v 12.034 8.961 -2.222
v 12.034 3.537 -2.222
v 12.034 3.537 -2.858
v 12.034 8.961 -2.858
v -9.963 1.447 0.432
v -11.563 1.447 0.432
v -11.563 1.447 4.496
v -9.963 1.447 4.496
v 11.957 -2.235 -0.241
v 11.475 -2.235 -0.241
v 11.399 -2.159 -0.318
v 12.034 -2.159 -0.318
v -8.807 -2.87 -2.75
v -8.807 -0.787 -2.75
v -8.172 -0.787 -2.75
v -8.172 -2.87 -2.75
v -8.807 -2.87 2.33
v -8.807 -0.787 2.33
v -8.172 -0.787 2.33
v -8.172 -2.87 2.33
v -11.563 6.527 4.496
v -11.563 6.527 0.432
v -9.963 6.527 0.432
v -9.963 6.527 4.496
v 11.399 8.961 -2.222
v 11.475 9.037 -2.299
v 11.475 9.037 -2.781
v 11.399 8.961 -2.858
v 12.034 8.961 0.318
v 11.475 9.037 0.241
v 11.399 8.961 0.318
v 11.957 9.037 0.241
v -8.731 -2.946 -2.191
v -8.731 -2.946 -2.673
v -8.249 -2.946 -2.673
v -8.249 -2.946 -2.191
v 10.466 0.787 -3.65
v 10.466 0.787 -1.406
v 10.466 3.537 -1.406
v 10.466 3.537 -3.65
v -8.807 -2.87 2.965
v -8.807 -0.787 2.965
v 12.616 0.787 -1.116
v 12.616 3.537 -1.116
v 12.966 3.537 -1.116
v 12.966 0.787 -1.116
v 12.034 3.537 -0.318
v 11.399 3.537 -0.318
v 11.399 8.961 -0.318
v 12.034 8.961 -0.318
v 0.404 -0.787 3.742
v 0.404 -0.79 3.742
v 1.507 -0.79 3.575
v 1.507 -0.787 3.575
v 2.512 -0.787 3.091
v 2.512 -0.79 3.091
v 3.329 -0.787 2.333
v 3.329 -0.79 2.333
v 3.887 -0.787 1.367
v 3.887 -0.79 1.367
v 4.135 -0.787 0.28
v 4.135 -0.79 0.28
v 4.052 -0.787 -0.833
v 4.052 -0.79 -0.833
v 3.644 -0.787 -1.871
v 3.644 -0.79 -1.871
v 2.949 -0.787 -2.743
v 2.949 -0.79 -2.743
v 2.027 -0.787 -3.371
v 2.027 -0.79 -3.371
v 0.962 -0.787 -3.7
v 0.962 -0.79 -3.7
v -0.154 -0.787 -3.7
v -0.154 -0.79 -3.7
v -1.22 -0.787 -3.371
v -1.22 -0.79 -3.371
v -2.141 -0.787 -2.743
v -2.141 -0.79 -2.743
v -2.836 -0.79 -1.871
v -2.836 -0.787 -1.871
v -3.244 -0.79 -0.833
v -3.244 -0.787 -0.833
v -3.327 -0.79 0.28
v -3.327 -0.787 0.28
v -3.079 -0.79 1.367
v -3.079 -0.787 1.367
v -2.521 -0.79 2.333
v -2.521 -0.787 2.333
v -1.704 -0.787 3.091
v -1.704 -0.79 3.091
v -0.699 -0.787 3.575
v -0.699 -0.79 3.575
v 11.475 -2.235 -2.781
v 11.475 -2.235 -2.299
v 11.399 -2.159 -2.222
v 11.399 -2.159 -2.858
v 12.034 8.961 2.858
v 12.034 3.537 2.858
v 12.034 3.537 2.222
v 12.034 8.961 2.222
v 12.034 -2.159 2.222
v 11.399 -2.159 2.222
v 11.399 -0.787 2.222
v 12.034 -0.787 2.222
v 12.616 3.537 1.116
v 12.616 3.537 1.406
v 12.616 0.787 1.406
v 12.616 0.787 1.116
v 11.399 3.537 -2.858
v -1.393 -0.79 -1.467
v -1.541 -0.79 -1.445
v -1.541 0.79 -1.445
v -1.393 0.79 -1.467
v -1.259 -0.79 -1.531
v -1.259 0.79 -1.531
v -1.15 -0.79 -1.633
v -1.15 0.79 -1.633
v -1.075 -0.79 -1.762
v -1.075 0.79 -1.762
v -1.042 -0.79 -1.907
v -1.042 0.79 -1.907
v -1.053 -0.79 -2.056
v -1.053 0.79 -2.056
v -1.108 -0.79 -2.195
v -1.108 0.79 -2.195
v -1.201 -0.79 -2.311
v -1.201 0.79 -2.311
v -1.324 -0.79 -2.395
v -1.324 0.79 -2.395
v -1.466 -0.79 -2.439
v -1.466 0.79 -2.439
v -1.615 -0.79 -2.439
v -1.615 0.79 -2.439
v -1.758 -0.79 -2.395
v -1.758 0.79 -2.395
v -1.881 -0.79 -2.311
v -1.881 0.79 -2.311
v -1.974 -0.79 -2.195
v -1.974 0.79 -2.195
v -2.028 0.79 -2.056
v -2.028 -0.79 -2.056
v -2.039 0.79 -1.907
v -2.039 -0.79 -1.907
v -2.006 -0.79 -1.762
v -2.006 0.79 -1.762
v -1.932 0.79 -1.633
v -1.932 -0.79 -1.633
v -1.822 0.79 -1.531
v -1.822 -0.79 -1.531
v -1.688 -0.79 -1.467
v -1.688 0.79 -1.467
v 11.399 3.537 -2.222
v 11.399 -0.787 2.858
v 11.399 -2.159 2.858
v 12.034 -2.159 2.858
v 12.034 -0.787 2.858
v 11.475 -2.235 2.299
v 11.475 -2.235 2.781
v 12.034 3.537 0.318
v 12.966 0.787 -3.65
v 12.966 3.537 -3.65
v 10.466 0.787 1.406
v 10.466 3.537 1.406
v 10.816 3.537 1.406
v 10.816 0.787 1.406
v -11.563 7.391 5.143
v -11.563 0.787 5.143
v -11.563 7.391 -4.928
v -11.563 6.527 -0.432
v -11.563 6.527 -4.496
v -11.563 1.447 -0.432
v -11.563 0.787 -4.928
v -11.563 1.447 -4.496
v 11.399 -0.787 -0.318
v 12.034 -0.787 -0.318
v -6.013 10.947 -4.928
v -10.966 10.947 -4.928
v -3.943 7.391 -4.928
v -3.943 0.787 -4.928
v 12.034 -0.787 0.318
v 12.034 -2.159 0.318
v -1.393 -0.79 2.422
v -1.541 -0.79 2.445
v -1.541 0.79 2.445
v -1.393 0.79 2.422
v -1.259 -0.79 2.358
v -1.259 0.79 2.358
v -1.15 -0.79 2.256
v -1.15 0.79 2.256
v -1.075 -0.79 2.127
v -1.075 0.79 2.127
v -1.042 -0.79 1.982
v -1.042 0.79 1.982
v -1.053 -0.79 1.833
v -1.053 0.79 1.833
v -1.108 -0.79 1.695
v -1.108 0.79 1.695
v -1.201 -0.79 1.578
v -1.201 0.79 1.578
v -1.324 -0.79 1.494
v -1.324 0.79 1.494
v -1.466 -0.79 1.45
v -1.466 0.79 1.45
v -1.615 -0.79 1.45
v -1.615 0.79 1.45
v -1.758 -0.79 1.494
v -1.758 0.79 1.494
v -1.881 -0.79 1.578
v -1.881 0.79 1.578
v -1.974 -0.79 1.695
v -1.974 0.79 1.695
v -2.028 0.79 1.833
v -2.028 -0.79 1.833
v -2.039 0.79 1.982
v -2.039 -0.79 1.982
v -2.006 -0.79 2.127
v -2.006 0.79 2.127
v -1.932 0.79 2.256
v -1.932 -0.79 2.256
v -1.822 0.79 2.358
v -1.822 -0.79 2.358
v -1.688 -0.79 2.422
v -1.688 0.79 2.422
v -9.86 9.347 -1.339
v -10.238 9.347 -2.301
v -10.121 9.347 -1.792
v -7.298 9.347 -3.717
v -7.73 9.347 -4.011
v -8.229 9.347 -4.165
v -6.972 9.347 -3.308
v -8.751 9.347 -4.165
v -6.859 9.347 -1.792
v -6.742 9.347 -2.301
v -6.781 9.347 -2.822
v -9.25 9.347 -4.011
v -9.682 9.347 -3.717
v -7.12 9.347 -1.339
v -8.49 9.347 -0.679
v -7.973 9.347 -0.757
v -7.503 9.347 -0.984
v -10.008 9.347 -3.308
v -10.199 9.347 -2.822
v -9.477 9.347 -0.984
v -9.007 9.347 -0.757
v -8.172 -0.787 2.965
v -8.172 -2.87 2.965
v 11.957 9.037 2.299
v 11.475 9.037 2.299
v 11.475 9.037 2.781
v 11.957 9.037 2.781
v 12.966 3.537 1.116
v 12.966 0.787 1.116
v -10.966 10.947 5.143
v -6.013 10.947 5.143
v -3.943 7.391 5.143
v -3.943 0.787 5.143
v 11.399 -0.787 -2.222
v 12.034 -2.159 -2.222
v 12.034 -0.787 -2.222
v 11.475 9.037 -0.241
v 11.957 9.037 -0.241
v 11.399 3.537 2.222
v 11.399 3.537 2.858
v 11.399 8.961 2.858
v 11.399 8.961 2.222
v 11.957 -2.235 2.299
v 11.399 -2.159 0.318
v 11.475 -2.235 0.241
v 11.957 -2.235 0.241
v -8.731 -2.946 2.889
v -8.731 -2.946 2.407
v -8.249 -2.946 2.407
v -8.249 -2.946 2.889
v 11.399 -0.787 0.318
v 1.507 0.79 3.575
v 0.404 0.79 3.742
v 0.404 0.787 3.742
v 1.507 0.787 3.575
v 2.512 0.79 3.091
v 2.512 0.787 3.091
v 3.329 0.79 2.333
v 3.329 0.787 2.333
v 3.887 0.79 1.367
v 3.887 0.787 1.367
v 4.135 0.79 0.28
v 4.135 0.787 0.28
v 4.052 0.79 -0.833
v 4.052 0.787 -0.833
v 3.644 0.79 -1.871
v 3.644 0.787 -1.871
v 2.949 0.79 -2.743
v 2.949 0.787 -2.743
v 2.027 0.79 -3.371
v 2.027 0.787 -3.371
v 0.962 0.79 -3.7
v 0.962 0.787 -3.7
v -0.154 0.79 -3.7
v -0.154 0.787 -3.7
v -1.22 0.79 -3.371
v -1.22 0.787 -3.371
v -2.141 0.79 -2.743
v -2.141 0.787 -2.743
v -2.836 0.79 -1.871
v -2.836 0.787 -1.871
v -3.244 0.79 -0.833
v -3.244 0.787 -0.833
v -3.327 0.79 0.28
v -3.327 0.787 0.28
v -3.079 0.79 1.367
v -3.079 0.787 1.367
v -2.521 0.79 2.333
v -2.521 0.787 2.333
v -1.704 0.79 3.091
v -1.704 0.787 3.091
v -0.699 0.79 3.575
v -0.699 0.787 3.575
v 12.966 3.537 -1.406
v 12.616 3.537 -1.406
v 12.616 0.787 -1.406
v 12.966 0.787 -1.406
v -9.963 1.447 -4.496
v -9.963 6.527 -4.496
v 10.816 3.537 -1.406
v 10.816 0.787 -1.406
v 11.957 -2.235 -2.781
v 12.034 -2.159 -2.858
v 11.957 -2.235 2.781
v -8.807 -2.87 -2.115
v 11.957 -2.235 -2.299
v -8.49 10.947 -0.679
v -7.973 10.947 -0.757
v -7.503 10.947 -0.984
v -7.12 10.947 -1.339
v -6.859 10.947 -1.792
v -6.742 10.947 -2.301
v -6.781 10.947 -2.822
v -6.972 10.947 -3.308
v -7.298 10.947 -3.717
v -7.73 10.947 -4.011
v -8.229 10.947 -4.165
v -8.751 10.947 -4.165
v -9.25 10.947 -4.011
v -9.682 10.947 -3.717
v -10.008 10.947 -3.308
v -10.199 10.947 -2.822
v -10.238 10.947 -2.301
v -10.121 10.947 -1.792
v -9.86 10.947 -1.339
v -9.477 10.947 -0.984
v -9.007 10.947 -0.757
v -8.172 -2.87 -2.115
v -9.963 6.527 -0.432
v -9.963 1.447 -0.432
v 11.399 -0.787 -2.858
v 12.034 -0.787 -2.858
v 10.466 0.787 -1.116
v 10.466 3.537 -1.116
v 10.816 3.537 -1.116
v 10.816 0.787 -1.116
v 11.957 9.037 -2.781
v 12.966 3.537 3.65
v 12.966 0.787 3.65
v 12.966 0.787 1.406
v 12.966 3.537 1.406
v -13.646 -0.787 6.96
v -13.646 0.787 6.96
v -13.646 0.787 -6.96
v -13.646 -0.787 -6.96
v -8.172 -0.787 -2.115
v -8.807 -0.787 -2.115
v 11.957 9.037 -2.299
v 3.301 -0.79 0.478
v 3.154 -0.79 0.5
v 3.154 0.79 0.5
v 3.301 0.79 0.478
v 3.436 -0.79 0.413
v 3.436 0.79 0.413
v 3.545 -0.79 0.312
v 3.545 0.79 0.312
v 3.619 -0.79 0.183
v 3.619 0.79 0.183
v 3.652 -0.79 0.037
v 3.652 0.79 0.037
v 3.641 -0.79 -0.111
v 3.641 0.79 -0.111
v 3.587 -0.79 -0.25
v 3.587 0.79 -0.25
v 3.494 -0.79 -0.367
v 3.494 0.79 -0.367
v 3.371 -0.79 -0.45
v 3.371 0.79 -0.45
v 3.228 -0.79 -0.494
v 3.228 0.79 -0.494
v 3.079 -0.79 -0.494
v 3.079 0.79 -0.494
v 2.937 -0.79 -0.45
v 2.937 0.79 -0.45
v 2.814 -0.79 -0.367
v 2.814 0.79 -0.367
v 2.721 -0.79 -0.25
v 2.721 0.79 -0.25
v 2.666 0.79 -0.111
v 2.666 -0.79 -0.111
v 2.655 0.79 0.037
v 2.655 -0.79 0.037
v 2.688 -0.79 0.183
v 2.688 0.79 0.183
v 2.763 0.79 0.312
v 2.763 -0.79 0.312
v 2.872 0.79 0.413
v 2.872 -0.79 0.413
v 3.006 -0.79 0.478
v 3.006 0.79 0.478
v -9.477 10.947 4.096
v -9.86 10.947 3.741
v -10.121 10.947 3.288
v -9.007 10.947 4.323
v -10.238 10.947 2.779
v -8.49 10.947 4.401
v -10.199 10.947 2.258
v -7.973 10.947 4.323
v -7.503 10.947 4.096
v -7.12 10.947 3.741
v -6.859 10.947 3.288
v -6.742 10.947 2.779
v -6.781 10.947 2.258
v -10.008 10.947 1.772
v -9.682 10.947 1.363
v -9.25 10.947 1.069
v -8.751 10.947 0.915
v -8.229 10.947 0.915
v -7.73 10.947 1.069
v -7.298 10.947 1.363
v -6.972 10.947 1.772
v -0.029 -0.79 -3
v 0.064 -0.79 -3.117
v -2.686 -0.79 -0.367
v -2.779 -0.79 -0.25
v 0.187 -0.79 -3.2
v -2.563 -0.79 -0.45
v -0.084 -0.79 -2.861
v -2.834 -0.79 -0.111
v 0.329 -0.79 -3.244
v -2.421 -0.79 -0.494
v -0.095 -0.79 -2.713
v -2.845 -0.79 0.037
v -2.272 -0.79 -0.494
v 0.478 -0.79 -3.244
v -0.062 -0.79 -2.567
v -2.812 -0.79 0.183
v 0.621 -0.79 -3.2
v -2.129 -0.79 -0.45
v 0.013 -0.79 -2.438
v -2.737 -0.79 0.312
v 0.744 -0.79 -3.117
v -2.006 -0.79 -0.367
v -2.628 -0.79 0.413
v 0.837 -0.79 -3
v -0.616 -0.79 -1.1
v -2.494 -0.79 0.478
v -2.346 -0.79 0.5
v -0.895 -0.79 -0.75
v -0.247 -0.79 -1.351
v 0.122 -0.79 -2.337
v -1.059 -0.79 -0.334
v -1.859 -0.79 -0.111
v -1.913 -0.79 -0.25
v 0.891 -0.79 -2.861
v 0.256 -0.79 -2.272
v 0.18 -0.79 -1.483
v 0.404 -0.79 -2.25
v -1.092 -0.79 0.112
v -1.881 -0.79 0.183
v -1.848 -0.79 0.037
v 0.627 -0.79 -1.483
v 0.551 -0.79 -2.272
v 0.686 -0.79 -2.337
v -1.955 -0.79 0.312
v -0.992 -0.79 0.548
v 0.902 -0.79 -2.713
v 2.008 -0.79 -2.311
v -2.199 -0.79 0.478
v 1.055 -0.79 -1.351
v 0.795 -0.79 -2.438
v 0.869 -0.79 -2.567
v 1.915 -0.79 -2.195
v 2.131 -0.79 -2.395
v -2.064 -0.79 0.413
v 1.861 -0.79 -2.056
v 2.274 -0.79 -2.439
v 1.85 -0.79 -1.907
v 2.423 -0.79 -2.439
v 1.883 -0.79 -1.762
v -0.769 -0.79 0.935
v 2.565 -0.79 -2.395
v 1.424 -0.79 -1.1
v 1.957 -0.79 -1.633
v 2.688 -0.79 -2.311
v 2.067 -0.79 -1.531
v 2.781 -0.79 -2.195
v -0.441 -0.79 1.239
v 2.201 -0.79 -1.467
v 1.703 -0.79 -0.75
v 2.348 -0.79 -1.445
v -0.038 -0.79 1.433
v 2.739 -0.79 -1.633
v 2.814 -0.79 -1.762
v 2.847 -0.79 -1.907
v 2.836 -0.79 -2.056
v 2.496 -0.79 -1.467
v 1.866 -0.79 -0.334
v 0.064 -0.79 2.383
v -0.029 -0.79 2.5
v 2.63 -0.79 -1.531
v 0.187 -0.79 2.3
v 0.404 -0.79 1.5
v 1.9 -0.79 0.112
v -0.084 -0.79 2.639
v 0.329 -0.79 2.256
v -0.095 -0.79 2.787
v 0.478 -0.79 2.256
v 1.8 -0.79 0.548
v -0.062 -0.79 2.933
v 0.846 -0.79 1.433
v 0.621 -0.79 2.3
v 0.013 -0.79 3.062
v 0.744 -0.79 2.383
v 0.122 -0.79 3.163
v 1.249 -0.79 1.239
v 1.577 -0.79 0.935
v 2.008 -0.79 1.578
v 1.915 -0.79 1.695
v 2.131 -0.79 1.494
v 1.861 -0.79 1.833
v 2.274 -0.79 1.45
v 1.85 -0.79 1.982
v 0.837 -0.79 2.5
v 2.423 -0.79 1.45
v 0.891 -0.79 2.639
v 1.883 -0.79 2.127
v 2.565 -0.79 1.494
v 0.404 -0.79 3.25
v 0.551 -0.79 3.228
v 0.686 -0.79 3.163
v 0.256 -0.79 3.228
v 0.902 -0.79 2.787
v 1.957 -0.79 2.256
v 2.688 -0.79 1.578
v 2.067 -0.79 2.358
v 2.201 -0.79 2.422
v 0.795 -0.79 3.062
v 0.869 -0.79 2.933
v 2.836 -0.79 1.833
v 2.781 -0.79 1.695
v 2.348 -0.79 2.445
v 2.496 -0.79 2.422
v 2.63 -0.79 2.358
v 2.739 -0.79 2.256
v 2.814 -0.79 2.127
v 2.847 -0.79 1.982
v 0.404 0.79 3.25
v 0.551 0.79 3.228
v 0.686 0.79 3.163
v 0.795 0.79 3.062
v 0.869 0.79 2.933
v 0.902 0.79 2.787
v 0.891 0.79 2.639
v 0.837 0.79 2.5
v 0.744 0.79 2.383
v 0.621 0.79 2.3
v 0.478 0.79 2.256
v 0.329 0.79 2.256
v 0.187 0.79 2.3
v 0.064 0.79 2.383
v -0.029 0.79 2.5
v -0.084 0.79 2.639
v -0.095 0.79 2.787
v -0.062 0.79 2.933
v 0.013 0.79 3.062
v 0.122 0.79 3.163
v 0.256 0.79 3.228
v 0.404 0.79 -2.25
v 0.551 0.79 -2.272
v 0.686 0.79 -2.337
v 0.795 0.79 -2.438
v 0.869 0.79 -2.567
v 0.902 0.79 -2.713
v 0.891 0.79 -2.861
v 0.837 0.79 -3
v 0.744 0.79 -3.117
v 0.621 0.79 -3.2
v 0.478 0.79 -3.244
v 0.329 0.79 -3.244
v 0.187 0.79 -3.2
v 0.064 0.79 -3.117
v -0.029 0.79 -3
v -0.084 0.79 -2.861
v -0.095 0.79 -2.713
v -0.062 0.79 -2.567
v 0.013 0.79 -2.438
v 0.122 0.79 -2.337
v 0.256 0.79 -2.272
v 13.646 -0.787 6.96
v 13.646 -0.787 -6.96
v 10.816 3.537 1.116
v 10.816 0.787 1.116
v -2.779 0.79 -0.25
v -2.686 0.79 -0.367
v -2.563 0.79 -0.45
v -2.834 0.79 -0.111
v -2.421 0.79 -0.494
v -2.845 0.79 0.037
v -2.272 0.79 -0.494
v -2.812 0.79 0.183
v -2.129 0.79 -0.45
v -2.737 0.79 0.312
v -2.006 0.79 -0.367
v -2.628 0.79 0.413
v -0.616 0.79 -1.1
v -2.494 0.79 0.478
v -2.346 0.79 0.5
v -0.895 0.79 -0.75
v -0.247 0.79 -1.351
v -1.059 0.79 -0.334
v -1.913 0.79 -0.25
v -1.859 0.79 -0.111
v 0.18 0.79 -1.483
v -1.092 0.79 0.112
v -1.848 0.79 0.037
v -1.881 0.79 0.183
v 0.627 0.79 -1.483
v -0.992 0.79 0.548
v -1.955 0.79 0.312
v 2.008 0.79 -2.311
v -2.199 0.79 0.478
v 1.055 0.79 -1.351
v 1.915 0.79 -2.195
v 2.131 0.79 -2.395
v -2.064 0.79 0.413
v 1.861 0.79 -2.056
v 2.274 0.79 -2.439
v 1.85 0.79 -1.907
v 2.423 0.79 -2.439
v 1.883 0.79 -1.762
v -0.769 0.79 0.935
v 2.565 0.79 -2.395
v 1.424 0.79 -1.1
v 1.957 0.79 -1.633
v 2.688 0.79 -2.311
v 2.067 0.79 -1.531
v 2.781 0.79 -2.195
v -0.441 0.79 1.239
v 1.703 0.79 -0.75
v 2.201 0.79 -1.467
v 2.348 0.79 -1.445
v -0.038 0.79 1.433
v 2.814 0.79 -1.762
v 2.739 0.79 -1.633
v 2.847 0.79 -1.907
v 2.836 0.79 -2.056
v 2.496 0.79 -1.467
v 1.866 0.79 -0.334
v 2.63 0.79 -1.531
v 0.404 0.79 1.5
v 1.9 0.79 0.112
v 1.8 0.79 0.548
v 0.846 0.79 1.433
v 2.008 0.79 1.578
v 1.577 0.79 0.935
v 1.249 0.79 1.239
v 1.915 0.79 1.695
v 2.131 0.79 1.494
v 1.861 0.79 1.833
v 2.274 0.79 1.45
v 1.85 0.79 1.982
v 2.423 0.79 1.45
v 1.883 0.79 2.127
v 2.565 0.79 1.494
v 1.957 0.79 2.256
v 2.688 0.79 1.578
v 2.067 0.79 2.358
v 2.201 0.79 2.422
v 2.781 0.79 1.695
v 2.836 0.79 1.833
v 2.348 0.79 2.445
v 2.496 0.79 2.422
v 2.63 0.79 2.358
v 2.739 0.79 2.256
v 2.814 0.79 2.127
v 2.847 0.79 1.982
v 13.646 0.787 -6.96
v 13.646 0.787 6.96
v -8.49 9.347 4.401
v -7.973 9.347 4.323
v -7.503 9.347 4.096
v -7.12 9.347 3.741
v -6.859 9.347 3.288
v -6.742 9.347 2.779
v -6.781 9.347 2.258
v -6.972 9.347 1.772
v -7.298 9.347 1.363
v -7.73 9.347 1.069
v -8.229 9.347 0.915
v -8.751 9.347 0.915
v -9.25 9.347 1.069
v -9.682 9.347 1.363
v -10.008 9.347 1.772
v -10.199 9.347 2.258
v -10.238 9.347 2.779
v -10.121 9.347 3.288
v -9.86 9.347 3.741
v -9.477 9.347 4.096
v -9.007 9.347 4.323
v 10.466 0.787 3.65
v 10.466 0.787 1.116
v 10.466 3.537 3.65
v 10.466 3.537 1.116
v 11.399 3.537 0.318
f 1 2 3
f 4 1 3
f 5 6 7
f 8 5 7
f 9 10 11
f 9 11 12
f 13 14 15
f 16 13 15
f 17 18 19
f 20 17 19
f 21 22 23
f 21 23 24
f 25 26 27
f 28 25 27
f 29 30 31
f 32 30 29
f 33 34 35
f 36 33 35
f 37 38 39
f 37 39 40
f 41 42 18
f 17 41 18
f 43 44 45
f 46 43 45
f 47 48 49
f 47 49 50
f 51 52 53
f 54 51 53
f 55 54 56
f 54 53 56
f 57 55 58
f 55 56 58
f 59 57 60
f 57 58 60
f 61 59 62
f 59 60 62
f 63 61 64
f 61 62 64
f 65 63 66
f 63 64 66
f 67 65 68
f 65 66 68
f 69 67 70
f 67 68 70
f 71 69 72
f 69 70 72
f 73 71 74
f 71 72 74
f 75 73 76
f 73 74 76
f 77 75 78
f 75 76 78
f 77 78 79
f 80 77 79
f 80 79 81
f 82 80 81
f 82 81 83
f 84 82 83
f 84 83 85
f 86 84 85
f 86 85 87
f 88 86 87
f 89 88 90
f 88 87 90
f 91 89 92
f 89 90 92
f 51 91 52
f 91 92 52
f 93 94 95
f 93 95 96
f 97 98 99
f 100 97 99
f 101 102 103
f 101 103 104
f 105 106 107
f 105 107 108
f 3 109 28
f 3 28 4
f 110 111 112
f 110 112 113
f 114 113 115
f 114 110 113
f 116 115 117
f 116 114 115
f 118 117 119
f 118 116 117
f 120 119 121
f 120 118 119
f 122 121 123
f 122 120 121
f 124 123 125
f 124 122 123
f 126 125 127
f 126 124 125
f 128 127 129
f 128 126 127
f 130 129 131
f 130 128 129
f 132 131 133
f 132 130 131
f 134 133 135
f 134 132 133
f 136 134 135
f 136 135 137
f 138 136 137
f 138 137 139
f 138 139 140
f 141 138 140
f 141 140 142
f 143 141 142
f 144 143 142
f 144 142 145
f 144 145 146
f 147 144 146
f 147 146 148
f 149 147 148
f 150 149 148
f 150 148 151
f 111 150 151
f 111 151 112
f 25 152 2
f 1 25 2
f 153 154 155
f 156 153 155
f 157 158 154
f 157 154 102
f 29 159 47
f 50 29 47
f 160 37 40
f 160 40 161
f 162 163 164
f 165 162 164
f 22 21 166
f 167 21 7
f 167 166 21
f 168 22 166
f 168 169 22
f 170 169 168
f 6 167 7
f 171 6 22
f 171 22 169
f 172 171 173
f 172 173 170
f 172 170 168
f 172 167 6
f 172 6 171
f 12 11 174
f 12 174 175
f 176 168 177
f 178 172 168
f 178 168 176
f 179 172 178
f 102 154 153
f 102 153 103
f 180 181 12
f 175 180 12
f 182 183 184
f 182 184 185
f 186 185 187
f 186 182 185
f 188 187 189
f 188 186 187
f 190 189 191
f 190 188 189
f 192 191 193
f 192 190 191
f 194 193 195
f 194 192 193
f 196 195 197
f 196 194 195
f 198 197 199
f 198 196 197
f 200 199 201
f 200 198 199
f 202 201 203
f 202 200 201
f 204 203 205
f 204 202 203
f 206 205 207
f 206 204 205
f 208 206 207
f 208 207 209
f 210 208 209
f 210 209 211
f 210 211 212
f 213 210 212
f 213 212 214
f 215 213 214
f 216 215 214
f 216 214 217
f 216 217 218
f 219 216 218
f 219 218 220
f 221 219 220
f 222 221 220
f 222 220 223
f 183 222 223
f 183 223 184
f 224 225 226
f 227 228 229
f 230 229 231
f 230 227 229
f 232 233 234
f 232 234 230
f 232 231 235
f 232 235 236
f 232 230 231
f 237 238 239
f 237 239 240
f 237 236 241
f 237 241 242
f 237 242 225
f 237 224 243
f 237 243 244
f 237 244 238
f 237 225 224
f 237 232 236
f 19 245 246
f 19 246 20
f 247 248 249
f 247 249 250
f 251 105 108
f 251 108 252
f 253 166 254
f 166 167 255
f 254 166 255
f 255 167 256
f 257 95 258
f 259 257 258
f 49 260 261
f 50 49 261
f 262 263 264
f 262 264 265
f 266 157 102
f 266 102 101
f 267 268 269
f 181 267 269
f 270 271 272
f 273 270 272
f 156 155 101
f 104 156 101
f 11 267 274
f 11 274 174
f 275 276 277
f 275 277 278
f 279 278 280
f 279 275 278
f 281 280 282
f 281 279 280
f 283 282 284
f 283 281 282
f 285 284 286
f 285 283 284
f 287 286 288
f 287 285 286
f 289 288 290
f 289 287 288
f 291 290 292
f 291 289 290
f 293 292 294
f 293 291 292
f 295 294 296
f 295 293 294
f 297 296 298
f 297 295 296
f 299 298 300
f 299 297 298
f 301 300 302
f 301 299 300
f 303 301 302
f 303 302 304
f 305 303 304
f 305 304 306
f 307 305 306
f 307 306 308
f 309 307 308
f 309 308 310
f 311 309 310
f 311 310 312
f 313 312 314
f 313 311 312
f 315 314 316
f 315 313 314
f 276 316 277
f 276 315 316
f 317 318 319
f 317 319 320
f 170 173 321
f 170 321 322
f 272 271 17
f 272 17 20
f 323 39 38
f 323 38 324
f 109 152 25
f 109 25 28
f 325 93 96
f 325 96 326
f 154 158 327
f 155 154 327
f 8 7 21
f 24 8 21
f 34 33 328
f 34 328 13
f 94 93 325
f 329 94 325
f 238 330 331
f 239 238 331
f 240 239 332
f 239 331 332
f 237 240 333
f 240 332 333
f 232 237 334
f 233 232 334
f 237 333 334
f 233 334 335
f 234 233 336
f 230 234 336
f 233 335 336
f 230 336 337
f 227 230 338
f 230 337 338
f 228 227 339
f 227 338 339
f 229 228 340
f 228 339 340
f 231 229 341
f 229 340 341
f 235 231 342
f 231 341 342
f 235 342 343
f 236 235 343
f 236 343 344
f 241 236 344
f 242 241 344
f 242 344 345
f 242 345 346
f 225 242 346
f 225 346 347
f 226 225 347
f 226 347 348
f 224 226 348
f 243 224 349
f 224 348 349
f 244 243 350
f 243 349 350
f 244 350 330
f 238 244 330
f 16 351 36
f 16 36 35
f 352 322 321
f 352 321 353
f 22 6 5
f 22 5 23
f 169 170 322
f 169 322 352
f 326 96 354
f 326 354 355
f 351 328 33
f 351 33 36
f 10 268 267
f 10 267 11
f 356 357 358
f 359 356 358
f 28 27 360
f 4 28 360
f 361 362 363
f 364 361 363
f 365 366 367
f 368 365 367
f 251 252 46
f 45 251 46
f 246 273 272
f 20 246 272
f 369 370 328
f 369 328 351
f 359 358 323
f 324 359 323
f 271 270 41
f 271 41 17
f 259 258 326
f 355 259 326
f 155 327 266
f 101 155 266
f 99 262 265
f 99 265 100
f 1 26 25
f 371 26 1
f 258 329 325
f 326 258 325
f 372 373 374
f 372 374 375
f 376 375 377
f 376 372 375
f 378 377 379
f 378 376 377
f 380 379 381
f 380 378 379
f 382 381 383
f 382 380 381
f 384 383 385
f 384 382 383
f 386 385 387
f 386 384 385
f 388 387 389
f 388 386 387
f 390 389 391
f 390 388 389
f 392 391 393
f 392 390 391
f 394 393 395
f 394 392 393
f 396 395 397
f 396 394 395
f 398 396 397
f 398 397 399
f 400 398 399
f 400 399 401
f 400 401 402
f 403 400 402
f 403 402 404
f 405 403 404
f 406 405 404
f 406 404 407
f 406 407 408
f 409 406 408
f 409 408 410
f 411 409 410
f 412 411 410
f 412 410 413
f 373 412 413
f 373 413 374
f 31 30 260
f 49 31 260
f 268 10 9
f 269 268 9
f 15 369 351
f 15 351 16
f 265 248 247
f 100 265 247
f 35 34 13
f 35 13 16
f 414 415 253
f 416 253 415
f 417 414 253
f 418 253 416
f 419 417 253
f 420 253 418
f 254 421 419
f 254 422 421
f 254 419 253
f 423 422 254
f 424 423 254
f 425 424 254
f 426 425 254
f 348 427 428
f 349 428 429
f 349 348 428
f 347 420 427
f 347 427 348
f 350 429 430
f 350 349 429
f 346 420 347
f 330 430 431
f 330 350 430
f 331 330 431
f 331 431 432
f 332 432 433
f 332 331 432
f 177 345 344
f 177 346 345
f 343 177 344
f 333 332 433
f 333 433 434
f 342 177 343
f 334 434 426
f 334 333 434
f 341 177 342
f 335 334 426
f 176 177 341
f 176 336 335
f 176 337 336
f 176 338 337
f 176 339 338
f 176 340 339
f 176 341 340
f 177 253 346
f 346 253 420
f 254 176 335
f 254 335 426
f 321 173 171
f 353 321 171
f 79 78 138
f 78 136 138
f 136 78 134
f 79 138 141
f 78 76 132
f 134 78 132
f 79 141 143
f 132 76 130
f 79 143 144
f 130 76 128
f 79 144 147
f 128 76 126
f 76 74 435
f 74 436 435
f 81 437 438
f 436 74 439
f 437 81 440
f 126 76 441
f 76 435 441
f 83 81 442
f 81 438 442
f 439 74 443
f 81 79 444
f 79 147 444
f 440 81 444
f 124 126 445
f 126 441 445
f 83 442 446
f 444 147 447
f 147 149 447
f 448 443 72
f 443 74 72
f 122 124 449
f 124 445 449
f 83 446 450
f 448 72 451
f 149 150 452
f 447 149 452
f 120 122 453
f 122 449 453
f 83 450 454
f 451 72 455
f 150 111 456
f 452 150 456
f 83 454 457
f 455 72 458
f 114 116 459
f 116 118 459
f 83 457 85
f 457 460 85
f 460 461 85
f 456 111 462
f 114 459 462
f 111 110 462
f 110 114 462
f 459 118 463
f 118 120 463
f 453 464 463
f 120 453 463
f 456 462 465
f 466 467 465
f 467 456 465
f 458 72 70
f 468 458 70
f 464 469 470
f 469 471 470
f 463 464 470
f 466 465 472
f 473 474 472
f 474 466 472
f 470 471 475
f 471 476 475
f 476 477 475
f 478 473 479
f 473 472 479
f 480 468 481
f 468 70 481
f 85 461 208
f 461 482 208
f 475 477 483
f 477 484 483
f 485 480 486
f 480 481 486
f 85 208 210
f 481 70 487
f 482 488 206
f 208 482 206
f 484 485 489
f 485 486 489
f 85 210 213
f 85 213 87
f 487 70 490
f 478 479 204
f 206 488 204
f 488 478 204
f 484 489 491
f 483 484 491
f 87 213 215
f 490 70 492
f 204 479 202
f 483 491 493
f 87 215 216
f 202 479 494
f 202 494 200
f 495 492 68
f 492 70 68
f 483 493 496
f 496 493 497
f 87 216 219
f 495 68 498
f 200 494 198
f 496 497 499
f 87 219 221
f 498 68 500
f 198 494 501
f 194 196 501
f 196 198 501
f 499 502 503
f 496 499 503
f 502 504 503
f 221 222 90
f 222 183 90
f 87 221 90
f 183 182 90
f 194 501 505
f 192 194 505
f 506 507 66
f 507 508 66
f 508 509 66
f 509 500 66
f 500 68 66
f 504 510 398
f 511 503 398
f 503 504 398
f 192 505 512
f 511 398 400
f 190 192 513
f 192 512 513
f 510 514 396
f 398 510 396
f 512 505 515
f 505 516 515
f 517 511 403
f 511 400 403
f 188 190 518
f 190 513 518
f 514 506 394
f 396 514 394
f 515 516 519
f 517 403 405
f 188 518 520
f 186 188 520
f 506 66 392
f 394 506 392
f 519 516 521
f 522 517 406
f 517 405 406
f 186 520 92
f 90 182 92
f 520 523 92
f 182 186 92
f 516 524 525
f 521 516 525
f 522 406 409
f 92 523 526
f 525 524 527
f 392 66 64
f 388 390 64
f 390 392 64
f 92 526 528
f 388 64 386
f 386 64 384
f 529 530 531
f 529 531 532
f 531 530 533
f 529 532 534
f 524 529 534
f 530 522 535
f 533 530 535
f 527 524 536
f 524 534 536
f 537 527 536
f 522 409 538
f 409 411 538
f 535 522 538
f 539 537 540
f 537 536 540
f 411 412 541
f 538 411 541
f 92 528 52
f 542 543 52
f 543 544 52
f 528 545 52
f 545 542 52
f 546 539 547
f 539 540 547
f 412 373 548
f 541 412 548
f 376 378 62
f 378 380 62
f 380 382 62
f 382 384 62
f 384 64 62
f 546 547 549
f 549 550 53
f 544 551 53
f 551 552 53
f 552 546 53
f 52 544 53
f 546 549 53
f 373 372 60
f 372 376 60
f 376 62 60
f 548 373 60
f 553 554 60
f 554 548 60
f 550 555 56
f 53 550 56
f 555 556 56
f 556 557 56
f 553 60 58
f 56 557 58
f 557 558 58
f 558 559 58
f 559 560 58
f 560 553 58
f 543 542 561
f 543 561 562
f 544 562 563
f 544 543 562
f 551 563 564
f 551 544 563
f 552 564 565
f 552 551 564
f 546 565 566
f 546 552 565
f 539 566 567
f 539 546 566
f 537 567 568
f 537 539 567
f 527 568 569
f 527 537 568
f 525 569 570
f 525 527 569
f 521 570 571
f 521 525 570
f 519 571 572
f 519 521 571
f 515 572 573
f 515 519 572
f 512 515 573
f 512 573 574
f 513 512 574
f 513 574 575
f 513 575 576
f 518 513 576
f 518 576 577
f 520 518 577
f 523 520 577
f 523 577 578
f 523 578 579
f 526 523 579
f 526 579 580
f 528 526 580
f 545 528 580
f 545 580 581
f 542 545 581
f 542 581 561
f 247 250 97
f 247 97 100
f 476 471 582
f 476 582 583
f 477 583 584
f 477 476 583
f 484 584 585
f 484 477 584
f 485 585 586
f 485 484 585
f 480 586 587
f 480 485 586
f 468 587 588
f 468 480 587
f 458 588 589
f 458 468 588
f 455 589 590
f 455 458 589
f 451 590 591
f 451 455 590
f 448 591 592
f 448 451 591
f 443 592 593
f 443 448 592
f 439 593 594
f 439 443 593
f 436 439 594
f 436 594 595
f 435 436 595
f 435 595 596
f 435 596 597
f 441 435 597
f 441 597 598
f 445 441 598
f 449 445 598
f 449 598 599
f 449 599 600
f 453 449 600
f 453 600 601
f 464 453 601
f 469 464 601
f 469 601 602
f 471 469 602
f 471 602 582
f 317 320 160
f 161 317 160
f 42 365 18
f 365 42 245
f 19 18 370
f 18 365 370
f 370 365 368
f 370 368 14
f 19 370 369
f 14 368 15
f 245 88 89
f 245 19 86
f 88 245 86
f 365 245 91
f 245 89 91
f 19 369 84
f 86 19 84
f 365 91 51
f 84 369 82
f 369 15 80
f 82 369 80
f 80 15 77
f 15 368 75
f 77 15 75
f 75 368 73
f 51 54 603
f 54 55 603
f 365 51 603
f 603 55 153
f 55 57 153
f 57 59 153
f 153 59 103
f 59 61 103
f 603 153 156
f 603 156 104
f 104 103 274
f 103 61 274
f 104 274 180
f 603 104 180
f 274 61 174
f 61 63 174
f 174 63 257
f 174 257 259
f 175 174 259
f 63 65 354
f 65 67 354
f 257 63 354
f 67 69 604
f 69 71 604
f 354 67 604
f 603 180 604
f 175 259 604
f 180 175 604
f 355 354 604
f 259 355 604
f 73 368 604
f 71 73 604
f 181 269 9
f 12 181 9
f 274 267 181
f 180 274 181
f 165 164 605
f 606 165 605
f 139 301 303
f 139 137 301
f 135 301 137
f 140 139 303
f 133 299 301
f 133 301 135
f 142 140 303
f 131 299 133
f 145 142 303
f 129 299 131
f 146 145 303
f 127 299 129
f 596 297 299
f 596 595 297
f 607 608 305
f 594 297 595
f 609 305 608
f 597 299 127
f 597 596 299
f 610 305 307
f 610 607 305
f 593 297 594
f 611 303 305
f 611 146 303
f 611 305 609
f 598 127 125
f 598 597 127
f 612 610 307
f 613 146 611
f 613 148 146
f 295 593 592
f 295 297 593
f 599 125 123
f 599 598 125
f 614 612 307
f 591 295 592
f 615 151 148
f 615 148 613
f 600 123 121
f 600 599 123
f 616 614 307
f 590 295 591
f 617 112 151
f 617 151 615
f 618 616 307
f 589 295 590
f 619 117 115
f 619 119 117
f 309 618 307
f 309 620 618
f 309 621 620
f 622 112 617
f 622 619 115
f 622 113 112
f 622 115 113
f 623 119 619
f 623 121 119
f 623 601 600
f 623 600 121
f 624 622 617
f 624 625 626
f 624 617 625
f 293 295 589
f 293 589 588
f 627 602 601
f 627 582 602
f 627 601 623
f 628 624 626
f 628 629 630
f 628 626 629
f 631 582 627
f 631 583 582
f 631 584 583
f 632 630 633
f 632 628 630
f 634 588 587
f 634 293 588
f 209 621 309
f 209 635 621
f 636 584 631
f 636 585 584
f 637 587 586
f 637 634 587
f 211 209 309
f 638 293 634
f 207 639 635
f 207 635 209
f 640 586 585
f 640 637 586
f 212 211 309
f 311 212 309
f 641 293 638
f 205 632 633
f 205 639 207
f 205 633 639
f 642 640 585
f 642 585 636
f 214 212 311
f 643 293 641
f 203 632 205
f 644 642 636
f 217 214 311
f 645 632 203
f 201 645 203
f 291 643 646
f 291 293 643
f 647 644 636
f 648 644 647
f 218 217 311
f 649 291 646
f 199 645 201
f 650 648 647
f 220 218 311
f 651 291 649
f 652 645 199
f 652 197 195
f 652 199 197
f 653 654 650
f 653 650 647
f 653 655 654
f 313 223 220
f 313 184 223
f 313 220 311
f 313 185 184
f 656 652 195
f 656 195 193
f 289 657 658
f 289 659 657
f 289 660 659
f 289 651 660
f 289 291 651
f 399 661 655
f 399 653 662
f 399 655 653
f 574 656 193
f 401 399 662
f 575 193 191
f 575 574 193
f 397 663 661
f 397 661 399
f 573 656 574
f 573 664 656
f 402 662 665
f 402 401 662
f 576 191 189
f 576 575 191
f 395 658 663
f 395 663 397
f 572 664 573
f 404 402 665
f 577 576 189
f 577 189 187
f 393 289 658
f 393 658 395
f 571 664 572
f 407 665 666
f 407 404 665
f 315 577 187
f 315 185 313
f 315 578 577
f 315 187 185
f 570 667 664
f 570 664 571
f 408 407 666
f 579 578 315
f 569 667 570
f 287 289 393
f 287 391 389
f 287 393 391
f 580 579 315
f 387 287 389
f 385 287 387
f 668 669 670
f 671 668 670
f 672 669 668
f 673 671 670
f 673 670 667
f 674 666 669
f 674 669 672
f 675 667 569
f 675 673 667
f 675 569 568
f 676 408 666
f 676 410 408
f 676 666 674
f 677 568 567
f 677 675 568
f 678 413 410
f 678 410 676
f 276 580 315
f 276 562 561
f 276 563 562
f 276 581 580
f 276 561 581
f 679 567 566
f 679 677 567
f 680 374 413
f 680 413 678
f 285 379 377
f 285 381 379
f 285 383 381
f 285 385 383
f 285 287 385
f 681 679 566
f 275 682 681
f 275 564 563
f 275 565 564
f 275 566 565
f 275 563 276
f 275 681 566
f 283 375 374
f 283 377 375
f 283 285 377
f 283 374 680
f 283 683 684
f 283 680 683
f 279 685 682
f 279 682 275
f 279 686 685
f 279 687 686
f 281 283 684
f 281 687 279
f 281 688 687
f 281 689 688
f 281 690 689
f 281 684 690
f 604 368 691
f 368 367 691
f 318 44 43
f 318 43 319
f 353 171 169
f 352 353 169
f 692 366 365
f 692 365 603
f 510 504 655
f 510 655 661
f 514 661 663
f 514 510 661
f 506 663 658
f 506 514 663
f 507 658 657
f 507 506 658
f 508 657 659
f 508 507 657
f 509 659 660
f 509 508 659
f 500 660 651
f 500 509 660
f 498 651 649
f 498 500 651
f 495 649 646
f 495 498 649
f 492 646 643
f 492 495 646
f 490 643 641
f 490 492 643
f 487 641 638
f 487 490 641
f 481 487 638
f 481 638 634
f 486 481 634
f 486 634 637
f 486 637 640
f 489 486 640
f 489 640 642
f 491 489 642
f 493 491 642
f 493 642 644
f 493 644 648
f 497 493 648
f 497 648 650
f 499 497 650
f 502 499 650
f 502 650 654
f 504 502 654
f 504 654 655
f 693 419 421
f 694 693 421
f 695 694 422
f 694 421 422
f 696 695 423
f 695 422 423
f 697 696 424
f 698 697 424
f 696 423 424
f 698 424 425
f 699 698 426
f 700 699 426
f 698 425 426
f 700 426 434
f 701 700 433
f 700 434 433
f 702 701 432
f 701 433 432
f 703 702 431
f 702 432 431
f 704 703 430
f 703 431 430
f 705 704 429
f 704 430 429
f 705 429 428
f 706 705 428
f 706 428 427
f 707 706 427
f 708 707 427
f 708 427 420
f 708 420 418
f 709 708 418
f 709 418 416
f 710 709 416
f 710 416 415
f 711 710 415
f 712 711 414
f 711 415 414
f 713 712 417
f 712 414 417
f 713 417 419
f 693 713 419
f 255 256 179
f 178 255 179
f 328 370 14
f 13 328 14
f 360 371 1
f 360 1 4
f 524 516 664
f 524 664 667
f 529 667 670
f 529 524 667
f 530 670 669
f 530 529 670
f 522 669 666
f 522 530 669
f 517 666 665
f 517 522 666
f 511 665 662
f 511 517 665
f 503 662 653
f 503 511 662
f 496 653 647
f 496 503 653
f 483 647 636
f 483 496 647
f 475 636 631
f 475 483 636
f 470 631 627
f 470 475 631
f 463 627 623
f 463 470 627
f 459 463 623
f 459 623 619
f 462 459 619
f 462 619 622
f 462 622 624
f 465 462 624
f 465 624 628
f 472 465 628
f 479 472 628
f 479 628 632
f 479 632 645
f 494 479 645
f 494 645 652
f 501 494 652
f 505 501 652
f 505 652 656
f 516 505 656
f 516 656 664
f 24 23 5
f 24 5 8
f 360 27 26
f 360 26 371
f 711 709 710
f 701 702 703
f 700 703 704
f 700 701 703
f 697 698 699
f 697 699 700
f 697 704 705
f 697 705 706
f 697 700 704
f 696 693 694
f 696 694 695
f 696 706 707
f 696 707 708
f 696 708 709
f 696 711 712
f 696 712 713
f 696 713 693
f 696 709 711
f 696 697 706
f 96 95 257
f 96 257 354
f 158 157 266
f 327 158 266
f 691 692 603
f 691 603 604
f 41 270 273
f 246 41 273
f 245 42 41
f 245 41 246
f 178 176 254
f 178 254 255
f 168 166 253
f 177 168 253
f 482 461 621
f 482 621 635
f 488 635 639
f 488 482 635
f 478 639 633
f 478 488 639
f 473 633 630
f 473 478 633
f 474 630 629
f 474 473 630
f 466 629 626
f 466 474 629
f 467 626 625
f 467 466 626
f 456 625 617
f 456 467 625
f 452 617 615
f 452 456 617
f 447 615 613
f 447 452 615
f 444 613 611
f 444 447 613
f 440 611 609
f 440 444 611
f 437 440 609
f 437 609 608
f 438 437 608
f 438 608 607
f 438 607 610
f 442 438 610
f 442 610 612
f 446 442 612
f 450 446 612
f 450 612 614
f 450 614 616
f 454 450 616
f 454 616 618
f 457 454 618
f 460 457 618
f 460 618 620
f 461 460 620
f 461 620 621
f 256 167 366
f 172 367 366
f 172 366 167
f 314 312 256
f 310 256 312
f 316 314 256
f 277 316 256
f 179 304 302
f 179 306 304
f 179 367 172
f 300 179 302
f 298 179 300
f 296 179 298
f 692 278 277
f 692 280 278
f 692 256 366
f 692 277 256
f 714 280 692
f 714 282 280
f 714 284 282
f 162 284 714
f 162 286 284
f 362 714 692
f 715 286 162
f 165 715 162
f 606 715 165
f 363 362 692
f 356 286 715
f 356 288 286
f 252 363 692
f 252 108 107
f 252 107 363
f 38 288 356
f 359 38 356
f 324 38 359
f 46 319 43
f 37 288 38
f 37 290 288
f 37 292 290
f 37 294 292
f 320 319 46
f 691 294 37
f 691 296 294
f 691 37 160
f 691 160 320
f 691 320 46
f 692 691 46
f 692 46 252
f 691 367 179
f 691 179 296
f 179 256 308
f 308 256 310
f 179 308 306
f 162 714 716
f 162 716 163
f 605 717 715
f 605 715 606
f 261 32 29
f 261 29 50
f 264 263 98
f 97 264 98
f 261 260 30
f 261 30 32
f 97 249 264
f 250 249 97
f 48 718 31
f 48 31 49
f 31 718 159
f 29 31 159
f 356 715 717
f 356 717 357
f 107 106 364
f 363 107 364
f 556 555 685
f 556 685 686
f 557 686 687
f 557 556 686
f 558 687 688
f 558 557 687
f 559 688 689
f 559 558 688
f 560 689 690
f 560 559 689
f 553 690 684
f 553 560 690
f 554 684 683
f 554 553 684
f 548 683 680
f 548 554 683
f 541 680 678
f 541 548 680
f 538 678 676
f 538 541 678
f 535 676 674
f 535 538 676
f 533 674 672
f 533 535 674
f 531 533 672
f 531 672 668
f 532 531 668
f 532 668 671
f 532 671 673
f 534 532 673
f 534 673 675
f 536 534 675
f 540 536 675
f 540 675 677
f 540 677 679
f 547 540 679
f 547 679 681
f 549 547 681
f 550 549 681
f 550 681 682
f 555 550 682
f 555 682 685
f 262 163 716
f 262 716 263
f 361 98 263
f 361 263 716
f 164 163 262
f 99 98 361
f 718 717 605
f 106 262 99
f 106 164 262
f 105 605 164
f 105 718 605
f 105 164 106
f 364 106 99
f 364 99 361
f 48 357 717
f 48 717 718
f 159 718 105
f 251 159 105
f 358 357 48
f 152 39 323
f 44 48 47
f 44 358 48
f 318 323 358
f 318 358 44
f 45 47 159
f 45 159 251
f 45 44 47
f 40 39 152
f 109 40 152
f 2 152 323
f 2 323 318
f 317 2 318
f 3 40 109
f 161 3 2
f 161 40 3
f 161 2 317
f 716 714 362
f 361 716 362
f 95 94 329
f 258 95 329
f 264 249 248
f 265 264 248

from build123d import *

# Parameters (mm, degrees)
SKETCH1_W                = 27.2923
SKETCH1_H                = 13.9192
BOSS_EXTRUDE1_DEPTH      = 0.7874
SKETCH2_R                = 1.5
SKETCH2_R_2              = 0.5
CUT_EXTRUDE1_DEPTH       = 16.399137542
SKETCH3_W                = 2.5
SKETCH3_H                = 7.3
BOSS_EXTRUDE2_DEPTH      = 2.75
SKETCH4_W                = 0.35
SKETCH4_H                = 0.29
CUT_EXTRUDE2_DEPTH       = 2.75
BOSS_EXTRUDE3_DEPTH      = 5.5
BOSS_EXTRUDE3_DEPTH_BACK = 5.7726
SKETCH5_W                = 0.635
SKETCH5_H                = 0.635
BOSS_EXTRUDE4_START      = 0.00254
SKETCH6_R                = 3.741578583
SKETCH6_R_2              = 0.5
SKETCH6_R_3              = 1.5
BOSS_EXTRUDE4_DEPTH      = 0.00254
SKETCH7_W                = 7.62
SKETCH7_H                = 10.0711
BOSS_EXTRUDE5_DEPTH      = 10.16
CUT_EXTRUDE3_DEPTH       = 19.82814406
CUT_EXTRUDE3_DEPTH_BACK  = 19.82814406
SKETCH9_R                = 1.7526
CUT_EXTRUDE4_DEPTH       = 1.6002
SKETCH10_W               = 0.635
SKETCH10_H               = 0.635
BOSS_EXTRUDE6_DEPTH      = 3.7338
CHAMFER1_SIZE            = 0.0762
SKETCH11_W               = 4.064
SKETCH11_H               = 5.08
CUT_EXTRUDE5_DEPTH       = 1.6002


with BuildPart() as part:
    # Sketch1 → Boss-Extrude1 (new, symmetric)
    with BuildSketch(Plane(origin=(0, 0, 0), x_dir=(1, 0, 0), z_dir=(0, 1, 0))):
        Rectangle(SKETCH1_W, SKETCH1_H)
    extrude(amount=BOSS_EXTRUDE1_DEPTH, both=True)

    # Sketch2 → Cut-Extrude1 (cut, through all)
    with BuildSketch(Plane(origin=(0, 0.7874, 0), x_dir=(1, 0, 0), z_dir=(0, 1, 0))):
        with Locations(Location((0.40385, 0, 0), (0, 0, 270))):
            Circle(SKETCH2_R)
        with Locations(Location((0.40385, 2.75, 0), (0, 0, 270))):
            Circle(SKETCH2_R_2)
        with Locations(Location((2.348393648, 1.944543648, 0), (0, 0, 270))):
            Circle(SKETCH2_R_2)
        with Locations(Location((3.15385, 0, 0), (0, 0, 270))):
            Circle(SKETCH2_R_2)
        with Locations(Location((2.348393648, -1.944543648, 0), (0, 0, 270))):
            Circle(SKETCH2_R_2)
        with Locations(Location((0.40385, -2.75, 0), (0, 0, 270))):
            Circle(SKETCH2_R_2)
        with Locations(Location((-1.540693648, -1.944543648, 0), (0, 0, 270))):
            Circle(SKETCH2_R_2)
        with Locations(Location((-2.34615, 0, 0), (0, 0, 270))):
            Circle(SKETCH2_R_2)
        with Locations(Location((-1.540693648, 1.944543648, 0), (0, 0, 270))):
            Circle(SKETCH2_R_2)
    extrude(amount=-CUT_EXTRUDE1_DEPTH, mode=Mode.SUBTRACT)

    # Sketch3 → Boss-Extrude2 (add)
    with BuildSketch(Plane(origin=(0, 0.7874, 0), x_dir=(1, 0, 0), z_dir=(0, 1, 0))):
        with Locations((11.71615, 0)):
            Rectangle(SKETCH3_W, SKETCH3_H)
    extrude(amount=BOSS_EXTRUDE2_DEPTH)

    # Sketch4 → Cut-Extrude2 (cut)
    with BuildSketch(Plane(origin=(0, 3.5374, 0), x_dir=(1, 0, 0), z_dir=(0, 1, 0))):
        with Locations((10.64115, 1.261418)):
            Rectangle(SKETCH4_W, SKETCH4_H)
        with Locations((10.64115, -1.261418)):
            Rectangle(SKETCH4_W, SKETCH4_H)
        with Locations((12.79115, -1.261418)):
            Rectangle(SKETCH4_W, SKETCH4_H)
        with Locations((12.79115, 1.261418)):
            Rectangle(SKETCH4_W, SKETCH4_H)
    extrude(amount=-CUT_EXTRUDE2_DEPTH, mode=Mode.SUBTRACT)

    # Sketch5 → Boss-Extrude3 (add, two sides: drawn at the far end of the back side and taken through both)
    with BuildSketch(Plane(origin=(0, 3.5374, 0), x_dir=(1, 0, 0), z_dir=(0, 1, 0)).offset(-BOSS_EXTRUDE3_DEPTH_BACK)):
        with Locations((11.71615, 0)):
            Rectangle(SKETCH5_W, SKETCH5_H)
        with Locations((11.71615, 2.54)):
            Rectangle(SKETCH5_W, SKETCH5_H)
        with Locations((11.71615, -2.54)):
            Rectangle(SKETCH5_W, SKETCH5_H)
    extrude(amount=BOSS_EXTRUDE3_DEPTH + BOSS_EXTRUDE3_DEPTH_BACK)

    # Sketch6 → Boss-Extrude4 (add)
    with BuildSketch(Plane(origin=(0, 0.7874, 0), x_dir=(1, 0, 0), z_dir=(0, 1, 0)).offset(BOSS_EXTRUDE4_START)):
        with Locations(Location((0.40385, 0, 0), (0, 0, 270))):
            Circle(SKETCH6_R)
        with Locations(Location((-2.34615, 0, 0), (0, 0, 270))):
            Circle(SKETCH6_R_2, mode=Mode.SUBTRACT)
        with Locations(Location((-1.540693648, -1.944543648, 0), (0, 0, 270))):
            Circle(SKETCH6_R_2, mode=Mode.SUBTRACT)
        with Locations(Location((0.40385, -2.75, 0), (0, 0, 270))):
            Circle(SKETCH6_R_2, mode=Mode.SUBTRACT)
        with Locations(Location((2.348393648, -1.944543648, 0), (0, 0, 270))):
            Circle(SKETCH6_R_2, mode=Mode.SUBTRACT)
        with Locations(Location((3.15385, 0, 0), (0, 0, 270))):
            Circle(SKETCH6_R_2, mode=Mode.SUBTRACT)
        with Locations(Location((2.348393648, 1.944543648, 0), (0, 0, 270))):
            Circle(SKETCH6_R_2, mode=Mode.SUBTRACT)
        with Locations(Location((0.40385, 0, 0), (0, 0, 270))):
            Circle(SKETCH6_R_3, mode=Mode.SUBTRACT)
        with Locations(Location((-1.540693648, 1.944543648, 0), (0, 0, 270))):
            Circle(SKETCH6_R_2, mode=Mode.SUBTRACT)
        with Locations(Location((0.40385, 2.75, 0), (0, 0, 270))):
            Circle(SKETCH6_R_2, mode=Mode.SUBTRACT)
    boss_extrude4 = extrude(amount=-BOSS_EXTRUDE4_DEPTH)

    # Mirror1: Boss-Extrude4 across plane
    add(boss_extrude4.mirror(Plane.ZX))

    # Sketch7 → Boss-Extrude5 (add)
    with BuildSketch(Plane(origin=(0, 0.7874, 0), x_dir=(1, 0, 0), z_dir=(0, 1, 0))):
        with Locations((-7.75335, -0.10795)):
            Rectangle(SKETCH7_W, SKETCH7_H)
    extrude(amount=BOSS_EXTRUDE5_DEPTH)

    # Sketch8 → Cut-Extrude3 (cut, two sides: drawn at the far end of the back side and taken through both)
    with BuildSketch(Plane.XY.offset(-CUT_EXTRUDE3_DEPTH_BACK)):
        Polygon((-6.01345, 10.9474), (-3.94335, 7.3914), (-3.94335, 10.9474), align=None)
        Polygon((-10.96645, 10.9474), (-11.56335, 10.9474), (-11.56335, 7.3914), align=None)
    extrude(amount=CUT_EXTRUDE3_DEPTH + CUT_EXTRUDE3_DEPTH_BACK, mode=Mode.SUBTRACT)

    # Sketch9 → Cut-Extrude4 (cut)
    with BuildSketch(Plane(origin=(0, 10.9474, 0), x_dir=(1, 0, 0), z_dir=(0, 1, 0))):
        with Locations(Location((-8.48995, 2.43205, 0), (0, 0, 270))):
            Circle(SKETCH9_R)
        with Locations(Location((-8.48995, -2.64795, 0), (0, 0, 270))):
            Circle(SKETCH9_R)
    extrude(amount=-CUT_EXTRUDE4_DEPTH, mode=Mode.SUBTRACT)

    # Sketch10 → Boss-Extrude6 (add)
    with BuildSketch(Plane(origin=(0, 0.7874, 0), x_dir=(1, 0, 0), z_dir=(0, 1, 0))):
        with Locations((-8.48995, 2.43205)):
            Rectangle(SKETCH10_W, SKETCH10_H)
        with Locations((-8.48995, -2.64795)):
            Rectangle(SKETCH10_W, SKETCH10_H)
    extrude(amount=-BOSS_EXTRUDE6_DEPTH)

    # Chamfer1
    chamfer1_edges = [part.edges().sort_by_distance(p)[0] for p in [
        (12.03365, -2.2352, 0),
        (11.71615, -2.2352, 0.3175),
        (11.39865, -2.2352, 0),
        (11.71615, -2.2352, -0.3175),
        (12.03365, 9.0374, 0),
        (11.71615, 9.0374, -0.3175),
        (11.39865, 9.0374, 0),
        (11.71615, 9.0374, 0.3175),
        (12.03365, -2.2352, -2.54),
        (11.71615, -2.2352, -2.2225),
        (11.39865, -2.2352, -2.54),
        (11.71615, -2.2352, -2.8575),
        (12.03365, 9.0374, -2.54),
        (11.71615, 9.0374, -2.8575),
        (11.39865, 9.0374, -2.54),
        (11.71615, 9.0374, -2.2225),
        (12.03365, -2.2352, 2.54),
        (11.71615, -2.2352, 2.8575),
        (11.39865, -2.2352, 2.54),
        (11.71615, -2.2352, 2.2225),
        (12.03365, 9.0374, 2.54),
        (11.71615, 9.0374, 2.2225),
        (11.39865, 9.0374, 2.54),
        (11.71615, 9.0374, 2.8575),
        (-8.17245, -2.9464, -2.43205),
        (-8.48995, -2.9464, -2.11455),
        (-8.80745, -2.9464, -2.43205),
        (-8.48995, -2.9464, -2.74955),
        (-8.17245, -2.9464, 2.64795),
        (-8.48995, -2.9464, 2.96545),
        (-8.80745, -2.9464, 2.64795),
        (-8.48995, -2.9464, 2.33045),
    ]]
    chamfer(chamfer1_edges, length=CHAMFER1_SIZE)

    # Sketch11 → Cut-Extrude5 (cut)
    with BuildSketch(Plane.ZY.offset(11.56335)):
        with Locations((-2.4638, 3.987287249)):
            Rectangle(SKETCH11_W, SKETCH11_H)
        with Locations((2.4638, 3.987287249)):
            Rectangle(SKETCH11_W, SKETCH11_H)
    extrude(amount=-CUT_EXTRUDE5_DEPTH, mode=Mode.SUBTRACT)


solid = part.part
